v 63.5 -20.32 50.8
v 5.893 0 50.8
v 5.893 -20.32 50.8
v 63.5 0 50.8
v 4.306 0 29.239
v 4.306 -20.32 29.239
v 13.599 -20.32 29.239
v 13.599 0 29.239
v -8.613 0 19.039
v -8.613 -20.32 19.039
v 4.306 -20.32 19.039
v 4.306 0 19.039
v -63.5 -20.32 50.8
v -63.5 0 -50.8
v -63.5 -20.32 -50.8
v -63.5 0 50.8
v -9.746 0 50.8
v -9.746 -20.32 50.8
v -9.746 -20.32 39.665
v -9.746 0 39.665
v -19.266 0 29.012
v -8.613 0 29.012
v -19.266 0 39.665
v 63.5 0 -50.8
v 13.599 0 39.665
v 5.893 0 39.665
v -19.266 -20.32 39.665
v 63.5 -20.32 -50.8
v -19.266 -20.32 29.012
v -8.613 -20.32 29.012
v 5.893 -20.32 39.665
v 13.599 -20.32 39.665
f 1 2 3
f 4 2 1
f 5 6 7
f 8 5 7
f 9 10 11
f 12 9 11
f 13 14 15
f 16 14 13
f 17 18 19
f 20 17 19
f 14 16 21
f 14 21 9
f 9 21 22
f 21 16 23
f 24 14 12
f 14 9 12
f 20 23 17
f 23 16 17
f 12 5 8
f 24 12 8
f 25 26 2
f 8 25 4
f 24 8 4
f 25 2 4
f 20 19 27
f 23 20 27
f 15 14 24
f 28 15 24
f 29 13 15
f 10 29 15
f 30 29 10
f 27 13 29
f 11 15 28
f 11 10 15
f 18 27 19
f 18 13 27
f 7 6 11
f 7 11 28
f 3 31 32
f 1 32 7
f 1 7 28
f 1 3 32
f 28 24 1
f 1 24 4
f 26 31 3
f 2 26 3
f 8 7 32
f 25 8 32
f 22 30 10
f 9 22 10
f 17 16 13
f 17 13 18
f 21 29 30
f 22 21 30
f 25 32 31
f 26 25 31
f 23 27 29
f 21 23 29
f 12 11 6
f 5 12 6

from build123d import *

# Parameters (mm, degrees)
F0_W     = 127
F0_H     = 101.6
F1_DEPTH = 20.32
F3_DEPTH = 25.4


with BuildPart() as f1:
    # F0 (on Front) → F1 (new body)
    with BuildSketch(Plane.XZ):
        Rectangle(F0_W, F0_H)
    extrude(amount=F1_DEPTH)

    # F2 (on face) → F3 (cut)
    with BuildSketch(Plane.XZ.offset(20.32)):
        Polygon((5.893087, 50.8), (-9.746261, 50.8), (-9.746261, 39.665014), (-19.265864, 39.665014), (-19.265864, 29.012125), (-8.612975, 29.012125), (-8.612975, 19.039206), (4.306488, 19.039206), (4.306488, 29.238781), (13.599434, 29.238781), (13.599434, 39.665014), (5.893087, 39.665014), align=None)
    extrude(amount=-F3_DEPTH, mode=Mode.SUBTRACT)


solid = f1.part
